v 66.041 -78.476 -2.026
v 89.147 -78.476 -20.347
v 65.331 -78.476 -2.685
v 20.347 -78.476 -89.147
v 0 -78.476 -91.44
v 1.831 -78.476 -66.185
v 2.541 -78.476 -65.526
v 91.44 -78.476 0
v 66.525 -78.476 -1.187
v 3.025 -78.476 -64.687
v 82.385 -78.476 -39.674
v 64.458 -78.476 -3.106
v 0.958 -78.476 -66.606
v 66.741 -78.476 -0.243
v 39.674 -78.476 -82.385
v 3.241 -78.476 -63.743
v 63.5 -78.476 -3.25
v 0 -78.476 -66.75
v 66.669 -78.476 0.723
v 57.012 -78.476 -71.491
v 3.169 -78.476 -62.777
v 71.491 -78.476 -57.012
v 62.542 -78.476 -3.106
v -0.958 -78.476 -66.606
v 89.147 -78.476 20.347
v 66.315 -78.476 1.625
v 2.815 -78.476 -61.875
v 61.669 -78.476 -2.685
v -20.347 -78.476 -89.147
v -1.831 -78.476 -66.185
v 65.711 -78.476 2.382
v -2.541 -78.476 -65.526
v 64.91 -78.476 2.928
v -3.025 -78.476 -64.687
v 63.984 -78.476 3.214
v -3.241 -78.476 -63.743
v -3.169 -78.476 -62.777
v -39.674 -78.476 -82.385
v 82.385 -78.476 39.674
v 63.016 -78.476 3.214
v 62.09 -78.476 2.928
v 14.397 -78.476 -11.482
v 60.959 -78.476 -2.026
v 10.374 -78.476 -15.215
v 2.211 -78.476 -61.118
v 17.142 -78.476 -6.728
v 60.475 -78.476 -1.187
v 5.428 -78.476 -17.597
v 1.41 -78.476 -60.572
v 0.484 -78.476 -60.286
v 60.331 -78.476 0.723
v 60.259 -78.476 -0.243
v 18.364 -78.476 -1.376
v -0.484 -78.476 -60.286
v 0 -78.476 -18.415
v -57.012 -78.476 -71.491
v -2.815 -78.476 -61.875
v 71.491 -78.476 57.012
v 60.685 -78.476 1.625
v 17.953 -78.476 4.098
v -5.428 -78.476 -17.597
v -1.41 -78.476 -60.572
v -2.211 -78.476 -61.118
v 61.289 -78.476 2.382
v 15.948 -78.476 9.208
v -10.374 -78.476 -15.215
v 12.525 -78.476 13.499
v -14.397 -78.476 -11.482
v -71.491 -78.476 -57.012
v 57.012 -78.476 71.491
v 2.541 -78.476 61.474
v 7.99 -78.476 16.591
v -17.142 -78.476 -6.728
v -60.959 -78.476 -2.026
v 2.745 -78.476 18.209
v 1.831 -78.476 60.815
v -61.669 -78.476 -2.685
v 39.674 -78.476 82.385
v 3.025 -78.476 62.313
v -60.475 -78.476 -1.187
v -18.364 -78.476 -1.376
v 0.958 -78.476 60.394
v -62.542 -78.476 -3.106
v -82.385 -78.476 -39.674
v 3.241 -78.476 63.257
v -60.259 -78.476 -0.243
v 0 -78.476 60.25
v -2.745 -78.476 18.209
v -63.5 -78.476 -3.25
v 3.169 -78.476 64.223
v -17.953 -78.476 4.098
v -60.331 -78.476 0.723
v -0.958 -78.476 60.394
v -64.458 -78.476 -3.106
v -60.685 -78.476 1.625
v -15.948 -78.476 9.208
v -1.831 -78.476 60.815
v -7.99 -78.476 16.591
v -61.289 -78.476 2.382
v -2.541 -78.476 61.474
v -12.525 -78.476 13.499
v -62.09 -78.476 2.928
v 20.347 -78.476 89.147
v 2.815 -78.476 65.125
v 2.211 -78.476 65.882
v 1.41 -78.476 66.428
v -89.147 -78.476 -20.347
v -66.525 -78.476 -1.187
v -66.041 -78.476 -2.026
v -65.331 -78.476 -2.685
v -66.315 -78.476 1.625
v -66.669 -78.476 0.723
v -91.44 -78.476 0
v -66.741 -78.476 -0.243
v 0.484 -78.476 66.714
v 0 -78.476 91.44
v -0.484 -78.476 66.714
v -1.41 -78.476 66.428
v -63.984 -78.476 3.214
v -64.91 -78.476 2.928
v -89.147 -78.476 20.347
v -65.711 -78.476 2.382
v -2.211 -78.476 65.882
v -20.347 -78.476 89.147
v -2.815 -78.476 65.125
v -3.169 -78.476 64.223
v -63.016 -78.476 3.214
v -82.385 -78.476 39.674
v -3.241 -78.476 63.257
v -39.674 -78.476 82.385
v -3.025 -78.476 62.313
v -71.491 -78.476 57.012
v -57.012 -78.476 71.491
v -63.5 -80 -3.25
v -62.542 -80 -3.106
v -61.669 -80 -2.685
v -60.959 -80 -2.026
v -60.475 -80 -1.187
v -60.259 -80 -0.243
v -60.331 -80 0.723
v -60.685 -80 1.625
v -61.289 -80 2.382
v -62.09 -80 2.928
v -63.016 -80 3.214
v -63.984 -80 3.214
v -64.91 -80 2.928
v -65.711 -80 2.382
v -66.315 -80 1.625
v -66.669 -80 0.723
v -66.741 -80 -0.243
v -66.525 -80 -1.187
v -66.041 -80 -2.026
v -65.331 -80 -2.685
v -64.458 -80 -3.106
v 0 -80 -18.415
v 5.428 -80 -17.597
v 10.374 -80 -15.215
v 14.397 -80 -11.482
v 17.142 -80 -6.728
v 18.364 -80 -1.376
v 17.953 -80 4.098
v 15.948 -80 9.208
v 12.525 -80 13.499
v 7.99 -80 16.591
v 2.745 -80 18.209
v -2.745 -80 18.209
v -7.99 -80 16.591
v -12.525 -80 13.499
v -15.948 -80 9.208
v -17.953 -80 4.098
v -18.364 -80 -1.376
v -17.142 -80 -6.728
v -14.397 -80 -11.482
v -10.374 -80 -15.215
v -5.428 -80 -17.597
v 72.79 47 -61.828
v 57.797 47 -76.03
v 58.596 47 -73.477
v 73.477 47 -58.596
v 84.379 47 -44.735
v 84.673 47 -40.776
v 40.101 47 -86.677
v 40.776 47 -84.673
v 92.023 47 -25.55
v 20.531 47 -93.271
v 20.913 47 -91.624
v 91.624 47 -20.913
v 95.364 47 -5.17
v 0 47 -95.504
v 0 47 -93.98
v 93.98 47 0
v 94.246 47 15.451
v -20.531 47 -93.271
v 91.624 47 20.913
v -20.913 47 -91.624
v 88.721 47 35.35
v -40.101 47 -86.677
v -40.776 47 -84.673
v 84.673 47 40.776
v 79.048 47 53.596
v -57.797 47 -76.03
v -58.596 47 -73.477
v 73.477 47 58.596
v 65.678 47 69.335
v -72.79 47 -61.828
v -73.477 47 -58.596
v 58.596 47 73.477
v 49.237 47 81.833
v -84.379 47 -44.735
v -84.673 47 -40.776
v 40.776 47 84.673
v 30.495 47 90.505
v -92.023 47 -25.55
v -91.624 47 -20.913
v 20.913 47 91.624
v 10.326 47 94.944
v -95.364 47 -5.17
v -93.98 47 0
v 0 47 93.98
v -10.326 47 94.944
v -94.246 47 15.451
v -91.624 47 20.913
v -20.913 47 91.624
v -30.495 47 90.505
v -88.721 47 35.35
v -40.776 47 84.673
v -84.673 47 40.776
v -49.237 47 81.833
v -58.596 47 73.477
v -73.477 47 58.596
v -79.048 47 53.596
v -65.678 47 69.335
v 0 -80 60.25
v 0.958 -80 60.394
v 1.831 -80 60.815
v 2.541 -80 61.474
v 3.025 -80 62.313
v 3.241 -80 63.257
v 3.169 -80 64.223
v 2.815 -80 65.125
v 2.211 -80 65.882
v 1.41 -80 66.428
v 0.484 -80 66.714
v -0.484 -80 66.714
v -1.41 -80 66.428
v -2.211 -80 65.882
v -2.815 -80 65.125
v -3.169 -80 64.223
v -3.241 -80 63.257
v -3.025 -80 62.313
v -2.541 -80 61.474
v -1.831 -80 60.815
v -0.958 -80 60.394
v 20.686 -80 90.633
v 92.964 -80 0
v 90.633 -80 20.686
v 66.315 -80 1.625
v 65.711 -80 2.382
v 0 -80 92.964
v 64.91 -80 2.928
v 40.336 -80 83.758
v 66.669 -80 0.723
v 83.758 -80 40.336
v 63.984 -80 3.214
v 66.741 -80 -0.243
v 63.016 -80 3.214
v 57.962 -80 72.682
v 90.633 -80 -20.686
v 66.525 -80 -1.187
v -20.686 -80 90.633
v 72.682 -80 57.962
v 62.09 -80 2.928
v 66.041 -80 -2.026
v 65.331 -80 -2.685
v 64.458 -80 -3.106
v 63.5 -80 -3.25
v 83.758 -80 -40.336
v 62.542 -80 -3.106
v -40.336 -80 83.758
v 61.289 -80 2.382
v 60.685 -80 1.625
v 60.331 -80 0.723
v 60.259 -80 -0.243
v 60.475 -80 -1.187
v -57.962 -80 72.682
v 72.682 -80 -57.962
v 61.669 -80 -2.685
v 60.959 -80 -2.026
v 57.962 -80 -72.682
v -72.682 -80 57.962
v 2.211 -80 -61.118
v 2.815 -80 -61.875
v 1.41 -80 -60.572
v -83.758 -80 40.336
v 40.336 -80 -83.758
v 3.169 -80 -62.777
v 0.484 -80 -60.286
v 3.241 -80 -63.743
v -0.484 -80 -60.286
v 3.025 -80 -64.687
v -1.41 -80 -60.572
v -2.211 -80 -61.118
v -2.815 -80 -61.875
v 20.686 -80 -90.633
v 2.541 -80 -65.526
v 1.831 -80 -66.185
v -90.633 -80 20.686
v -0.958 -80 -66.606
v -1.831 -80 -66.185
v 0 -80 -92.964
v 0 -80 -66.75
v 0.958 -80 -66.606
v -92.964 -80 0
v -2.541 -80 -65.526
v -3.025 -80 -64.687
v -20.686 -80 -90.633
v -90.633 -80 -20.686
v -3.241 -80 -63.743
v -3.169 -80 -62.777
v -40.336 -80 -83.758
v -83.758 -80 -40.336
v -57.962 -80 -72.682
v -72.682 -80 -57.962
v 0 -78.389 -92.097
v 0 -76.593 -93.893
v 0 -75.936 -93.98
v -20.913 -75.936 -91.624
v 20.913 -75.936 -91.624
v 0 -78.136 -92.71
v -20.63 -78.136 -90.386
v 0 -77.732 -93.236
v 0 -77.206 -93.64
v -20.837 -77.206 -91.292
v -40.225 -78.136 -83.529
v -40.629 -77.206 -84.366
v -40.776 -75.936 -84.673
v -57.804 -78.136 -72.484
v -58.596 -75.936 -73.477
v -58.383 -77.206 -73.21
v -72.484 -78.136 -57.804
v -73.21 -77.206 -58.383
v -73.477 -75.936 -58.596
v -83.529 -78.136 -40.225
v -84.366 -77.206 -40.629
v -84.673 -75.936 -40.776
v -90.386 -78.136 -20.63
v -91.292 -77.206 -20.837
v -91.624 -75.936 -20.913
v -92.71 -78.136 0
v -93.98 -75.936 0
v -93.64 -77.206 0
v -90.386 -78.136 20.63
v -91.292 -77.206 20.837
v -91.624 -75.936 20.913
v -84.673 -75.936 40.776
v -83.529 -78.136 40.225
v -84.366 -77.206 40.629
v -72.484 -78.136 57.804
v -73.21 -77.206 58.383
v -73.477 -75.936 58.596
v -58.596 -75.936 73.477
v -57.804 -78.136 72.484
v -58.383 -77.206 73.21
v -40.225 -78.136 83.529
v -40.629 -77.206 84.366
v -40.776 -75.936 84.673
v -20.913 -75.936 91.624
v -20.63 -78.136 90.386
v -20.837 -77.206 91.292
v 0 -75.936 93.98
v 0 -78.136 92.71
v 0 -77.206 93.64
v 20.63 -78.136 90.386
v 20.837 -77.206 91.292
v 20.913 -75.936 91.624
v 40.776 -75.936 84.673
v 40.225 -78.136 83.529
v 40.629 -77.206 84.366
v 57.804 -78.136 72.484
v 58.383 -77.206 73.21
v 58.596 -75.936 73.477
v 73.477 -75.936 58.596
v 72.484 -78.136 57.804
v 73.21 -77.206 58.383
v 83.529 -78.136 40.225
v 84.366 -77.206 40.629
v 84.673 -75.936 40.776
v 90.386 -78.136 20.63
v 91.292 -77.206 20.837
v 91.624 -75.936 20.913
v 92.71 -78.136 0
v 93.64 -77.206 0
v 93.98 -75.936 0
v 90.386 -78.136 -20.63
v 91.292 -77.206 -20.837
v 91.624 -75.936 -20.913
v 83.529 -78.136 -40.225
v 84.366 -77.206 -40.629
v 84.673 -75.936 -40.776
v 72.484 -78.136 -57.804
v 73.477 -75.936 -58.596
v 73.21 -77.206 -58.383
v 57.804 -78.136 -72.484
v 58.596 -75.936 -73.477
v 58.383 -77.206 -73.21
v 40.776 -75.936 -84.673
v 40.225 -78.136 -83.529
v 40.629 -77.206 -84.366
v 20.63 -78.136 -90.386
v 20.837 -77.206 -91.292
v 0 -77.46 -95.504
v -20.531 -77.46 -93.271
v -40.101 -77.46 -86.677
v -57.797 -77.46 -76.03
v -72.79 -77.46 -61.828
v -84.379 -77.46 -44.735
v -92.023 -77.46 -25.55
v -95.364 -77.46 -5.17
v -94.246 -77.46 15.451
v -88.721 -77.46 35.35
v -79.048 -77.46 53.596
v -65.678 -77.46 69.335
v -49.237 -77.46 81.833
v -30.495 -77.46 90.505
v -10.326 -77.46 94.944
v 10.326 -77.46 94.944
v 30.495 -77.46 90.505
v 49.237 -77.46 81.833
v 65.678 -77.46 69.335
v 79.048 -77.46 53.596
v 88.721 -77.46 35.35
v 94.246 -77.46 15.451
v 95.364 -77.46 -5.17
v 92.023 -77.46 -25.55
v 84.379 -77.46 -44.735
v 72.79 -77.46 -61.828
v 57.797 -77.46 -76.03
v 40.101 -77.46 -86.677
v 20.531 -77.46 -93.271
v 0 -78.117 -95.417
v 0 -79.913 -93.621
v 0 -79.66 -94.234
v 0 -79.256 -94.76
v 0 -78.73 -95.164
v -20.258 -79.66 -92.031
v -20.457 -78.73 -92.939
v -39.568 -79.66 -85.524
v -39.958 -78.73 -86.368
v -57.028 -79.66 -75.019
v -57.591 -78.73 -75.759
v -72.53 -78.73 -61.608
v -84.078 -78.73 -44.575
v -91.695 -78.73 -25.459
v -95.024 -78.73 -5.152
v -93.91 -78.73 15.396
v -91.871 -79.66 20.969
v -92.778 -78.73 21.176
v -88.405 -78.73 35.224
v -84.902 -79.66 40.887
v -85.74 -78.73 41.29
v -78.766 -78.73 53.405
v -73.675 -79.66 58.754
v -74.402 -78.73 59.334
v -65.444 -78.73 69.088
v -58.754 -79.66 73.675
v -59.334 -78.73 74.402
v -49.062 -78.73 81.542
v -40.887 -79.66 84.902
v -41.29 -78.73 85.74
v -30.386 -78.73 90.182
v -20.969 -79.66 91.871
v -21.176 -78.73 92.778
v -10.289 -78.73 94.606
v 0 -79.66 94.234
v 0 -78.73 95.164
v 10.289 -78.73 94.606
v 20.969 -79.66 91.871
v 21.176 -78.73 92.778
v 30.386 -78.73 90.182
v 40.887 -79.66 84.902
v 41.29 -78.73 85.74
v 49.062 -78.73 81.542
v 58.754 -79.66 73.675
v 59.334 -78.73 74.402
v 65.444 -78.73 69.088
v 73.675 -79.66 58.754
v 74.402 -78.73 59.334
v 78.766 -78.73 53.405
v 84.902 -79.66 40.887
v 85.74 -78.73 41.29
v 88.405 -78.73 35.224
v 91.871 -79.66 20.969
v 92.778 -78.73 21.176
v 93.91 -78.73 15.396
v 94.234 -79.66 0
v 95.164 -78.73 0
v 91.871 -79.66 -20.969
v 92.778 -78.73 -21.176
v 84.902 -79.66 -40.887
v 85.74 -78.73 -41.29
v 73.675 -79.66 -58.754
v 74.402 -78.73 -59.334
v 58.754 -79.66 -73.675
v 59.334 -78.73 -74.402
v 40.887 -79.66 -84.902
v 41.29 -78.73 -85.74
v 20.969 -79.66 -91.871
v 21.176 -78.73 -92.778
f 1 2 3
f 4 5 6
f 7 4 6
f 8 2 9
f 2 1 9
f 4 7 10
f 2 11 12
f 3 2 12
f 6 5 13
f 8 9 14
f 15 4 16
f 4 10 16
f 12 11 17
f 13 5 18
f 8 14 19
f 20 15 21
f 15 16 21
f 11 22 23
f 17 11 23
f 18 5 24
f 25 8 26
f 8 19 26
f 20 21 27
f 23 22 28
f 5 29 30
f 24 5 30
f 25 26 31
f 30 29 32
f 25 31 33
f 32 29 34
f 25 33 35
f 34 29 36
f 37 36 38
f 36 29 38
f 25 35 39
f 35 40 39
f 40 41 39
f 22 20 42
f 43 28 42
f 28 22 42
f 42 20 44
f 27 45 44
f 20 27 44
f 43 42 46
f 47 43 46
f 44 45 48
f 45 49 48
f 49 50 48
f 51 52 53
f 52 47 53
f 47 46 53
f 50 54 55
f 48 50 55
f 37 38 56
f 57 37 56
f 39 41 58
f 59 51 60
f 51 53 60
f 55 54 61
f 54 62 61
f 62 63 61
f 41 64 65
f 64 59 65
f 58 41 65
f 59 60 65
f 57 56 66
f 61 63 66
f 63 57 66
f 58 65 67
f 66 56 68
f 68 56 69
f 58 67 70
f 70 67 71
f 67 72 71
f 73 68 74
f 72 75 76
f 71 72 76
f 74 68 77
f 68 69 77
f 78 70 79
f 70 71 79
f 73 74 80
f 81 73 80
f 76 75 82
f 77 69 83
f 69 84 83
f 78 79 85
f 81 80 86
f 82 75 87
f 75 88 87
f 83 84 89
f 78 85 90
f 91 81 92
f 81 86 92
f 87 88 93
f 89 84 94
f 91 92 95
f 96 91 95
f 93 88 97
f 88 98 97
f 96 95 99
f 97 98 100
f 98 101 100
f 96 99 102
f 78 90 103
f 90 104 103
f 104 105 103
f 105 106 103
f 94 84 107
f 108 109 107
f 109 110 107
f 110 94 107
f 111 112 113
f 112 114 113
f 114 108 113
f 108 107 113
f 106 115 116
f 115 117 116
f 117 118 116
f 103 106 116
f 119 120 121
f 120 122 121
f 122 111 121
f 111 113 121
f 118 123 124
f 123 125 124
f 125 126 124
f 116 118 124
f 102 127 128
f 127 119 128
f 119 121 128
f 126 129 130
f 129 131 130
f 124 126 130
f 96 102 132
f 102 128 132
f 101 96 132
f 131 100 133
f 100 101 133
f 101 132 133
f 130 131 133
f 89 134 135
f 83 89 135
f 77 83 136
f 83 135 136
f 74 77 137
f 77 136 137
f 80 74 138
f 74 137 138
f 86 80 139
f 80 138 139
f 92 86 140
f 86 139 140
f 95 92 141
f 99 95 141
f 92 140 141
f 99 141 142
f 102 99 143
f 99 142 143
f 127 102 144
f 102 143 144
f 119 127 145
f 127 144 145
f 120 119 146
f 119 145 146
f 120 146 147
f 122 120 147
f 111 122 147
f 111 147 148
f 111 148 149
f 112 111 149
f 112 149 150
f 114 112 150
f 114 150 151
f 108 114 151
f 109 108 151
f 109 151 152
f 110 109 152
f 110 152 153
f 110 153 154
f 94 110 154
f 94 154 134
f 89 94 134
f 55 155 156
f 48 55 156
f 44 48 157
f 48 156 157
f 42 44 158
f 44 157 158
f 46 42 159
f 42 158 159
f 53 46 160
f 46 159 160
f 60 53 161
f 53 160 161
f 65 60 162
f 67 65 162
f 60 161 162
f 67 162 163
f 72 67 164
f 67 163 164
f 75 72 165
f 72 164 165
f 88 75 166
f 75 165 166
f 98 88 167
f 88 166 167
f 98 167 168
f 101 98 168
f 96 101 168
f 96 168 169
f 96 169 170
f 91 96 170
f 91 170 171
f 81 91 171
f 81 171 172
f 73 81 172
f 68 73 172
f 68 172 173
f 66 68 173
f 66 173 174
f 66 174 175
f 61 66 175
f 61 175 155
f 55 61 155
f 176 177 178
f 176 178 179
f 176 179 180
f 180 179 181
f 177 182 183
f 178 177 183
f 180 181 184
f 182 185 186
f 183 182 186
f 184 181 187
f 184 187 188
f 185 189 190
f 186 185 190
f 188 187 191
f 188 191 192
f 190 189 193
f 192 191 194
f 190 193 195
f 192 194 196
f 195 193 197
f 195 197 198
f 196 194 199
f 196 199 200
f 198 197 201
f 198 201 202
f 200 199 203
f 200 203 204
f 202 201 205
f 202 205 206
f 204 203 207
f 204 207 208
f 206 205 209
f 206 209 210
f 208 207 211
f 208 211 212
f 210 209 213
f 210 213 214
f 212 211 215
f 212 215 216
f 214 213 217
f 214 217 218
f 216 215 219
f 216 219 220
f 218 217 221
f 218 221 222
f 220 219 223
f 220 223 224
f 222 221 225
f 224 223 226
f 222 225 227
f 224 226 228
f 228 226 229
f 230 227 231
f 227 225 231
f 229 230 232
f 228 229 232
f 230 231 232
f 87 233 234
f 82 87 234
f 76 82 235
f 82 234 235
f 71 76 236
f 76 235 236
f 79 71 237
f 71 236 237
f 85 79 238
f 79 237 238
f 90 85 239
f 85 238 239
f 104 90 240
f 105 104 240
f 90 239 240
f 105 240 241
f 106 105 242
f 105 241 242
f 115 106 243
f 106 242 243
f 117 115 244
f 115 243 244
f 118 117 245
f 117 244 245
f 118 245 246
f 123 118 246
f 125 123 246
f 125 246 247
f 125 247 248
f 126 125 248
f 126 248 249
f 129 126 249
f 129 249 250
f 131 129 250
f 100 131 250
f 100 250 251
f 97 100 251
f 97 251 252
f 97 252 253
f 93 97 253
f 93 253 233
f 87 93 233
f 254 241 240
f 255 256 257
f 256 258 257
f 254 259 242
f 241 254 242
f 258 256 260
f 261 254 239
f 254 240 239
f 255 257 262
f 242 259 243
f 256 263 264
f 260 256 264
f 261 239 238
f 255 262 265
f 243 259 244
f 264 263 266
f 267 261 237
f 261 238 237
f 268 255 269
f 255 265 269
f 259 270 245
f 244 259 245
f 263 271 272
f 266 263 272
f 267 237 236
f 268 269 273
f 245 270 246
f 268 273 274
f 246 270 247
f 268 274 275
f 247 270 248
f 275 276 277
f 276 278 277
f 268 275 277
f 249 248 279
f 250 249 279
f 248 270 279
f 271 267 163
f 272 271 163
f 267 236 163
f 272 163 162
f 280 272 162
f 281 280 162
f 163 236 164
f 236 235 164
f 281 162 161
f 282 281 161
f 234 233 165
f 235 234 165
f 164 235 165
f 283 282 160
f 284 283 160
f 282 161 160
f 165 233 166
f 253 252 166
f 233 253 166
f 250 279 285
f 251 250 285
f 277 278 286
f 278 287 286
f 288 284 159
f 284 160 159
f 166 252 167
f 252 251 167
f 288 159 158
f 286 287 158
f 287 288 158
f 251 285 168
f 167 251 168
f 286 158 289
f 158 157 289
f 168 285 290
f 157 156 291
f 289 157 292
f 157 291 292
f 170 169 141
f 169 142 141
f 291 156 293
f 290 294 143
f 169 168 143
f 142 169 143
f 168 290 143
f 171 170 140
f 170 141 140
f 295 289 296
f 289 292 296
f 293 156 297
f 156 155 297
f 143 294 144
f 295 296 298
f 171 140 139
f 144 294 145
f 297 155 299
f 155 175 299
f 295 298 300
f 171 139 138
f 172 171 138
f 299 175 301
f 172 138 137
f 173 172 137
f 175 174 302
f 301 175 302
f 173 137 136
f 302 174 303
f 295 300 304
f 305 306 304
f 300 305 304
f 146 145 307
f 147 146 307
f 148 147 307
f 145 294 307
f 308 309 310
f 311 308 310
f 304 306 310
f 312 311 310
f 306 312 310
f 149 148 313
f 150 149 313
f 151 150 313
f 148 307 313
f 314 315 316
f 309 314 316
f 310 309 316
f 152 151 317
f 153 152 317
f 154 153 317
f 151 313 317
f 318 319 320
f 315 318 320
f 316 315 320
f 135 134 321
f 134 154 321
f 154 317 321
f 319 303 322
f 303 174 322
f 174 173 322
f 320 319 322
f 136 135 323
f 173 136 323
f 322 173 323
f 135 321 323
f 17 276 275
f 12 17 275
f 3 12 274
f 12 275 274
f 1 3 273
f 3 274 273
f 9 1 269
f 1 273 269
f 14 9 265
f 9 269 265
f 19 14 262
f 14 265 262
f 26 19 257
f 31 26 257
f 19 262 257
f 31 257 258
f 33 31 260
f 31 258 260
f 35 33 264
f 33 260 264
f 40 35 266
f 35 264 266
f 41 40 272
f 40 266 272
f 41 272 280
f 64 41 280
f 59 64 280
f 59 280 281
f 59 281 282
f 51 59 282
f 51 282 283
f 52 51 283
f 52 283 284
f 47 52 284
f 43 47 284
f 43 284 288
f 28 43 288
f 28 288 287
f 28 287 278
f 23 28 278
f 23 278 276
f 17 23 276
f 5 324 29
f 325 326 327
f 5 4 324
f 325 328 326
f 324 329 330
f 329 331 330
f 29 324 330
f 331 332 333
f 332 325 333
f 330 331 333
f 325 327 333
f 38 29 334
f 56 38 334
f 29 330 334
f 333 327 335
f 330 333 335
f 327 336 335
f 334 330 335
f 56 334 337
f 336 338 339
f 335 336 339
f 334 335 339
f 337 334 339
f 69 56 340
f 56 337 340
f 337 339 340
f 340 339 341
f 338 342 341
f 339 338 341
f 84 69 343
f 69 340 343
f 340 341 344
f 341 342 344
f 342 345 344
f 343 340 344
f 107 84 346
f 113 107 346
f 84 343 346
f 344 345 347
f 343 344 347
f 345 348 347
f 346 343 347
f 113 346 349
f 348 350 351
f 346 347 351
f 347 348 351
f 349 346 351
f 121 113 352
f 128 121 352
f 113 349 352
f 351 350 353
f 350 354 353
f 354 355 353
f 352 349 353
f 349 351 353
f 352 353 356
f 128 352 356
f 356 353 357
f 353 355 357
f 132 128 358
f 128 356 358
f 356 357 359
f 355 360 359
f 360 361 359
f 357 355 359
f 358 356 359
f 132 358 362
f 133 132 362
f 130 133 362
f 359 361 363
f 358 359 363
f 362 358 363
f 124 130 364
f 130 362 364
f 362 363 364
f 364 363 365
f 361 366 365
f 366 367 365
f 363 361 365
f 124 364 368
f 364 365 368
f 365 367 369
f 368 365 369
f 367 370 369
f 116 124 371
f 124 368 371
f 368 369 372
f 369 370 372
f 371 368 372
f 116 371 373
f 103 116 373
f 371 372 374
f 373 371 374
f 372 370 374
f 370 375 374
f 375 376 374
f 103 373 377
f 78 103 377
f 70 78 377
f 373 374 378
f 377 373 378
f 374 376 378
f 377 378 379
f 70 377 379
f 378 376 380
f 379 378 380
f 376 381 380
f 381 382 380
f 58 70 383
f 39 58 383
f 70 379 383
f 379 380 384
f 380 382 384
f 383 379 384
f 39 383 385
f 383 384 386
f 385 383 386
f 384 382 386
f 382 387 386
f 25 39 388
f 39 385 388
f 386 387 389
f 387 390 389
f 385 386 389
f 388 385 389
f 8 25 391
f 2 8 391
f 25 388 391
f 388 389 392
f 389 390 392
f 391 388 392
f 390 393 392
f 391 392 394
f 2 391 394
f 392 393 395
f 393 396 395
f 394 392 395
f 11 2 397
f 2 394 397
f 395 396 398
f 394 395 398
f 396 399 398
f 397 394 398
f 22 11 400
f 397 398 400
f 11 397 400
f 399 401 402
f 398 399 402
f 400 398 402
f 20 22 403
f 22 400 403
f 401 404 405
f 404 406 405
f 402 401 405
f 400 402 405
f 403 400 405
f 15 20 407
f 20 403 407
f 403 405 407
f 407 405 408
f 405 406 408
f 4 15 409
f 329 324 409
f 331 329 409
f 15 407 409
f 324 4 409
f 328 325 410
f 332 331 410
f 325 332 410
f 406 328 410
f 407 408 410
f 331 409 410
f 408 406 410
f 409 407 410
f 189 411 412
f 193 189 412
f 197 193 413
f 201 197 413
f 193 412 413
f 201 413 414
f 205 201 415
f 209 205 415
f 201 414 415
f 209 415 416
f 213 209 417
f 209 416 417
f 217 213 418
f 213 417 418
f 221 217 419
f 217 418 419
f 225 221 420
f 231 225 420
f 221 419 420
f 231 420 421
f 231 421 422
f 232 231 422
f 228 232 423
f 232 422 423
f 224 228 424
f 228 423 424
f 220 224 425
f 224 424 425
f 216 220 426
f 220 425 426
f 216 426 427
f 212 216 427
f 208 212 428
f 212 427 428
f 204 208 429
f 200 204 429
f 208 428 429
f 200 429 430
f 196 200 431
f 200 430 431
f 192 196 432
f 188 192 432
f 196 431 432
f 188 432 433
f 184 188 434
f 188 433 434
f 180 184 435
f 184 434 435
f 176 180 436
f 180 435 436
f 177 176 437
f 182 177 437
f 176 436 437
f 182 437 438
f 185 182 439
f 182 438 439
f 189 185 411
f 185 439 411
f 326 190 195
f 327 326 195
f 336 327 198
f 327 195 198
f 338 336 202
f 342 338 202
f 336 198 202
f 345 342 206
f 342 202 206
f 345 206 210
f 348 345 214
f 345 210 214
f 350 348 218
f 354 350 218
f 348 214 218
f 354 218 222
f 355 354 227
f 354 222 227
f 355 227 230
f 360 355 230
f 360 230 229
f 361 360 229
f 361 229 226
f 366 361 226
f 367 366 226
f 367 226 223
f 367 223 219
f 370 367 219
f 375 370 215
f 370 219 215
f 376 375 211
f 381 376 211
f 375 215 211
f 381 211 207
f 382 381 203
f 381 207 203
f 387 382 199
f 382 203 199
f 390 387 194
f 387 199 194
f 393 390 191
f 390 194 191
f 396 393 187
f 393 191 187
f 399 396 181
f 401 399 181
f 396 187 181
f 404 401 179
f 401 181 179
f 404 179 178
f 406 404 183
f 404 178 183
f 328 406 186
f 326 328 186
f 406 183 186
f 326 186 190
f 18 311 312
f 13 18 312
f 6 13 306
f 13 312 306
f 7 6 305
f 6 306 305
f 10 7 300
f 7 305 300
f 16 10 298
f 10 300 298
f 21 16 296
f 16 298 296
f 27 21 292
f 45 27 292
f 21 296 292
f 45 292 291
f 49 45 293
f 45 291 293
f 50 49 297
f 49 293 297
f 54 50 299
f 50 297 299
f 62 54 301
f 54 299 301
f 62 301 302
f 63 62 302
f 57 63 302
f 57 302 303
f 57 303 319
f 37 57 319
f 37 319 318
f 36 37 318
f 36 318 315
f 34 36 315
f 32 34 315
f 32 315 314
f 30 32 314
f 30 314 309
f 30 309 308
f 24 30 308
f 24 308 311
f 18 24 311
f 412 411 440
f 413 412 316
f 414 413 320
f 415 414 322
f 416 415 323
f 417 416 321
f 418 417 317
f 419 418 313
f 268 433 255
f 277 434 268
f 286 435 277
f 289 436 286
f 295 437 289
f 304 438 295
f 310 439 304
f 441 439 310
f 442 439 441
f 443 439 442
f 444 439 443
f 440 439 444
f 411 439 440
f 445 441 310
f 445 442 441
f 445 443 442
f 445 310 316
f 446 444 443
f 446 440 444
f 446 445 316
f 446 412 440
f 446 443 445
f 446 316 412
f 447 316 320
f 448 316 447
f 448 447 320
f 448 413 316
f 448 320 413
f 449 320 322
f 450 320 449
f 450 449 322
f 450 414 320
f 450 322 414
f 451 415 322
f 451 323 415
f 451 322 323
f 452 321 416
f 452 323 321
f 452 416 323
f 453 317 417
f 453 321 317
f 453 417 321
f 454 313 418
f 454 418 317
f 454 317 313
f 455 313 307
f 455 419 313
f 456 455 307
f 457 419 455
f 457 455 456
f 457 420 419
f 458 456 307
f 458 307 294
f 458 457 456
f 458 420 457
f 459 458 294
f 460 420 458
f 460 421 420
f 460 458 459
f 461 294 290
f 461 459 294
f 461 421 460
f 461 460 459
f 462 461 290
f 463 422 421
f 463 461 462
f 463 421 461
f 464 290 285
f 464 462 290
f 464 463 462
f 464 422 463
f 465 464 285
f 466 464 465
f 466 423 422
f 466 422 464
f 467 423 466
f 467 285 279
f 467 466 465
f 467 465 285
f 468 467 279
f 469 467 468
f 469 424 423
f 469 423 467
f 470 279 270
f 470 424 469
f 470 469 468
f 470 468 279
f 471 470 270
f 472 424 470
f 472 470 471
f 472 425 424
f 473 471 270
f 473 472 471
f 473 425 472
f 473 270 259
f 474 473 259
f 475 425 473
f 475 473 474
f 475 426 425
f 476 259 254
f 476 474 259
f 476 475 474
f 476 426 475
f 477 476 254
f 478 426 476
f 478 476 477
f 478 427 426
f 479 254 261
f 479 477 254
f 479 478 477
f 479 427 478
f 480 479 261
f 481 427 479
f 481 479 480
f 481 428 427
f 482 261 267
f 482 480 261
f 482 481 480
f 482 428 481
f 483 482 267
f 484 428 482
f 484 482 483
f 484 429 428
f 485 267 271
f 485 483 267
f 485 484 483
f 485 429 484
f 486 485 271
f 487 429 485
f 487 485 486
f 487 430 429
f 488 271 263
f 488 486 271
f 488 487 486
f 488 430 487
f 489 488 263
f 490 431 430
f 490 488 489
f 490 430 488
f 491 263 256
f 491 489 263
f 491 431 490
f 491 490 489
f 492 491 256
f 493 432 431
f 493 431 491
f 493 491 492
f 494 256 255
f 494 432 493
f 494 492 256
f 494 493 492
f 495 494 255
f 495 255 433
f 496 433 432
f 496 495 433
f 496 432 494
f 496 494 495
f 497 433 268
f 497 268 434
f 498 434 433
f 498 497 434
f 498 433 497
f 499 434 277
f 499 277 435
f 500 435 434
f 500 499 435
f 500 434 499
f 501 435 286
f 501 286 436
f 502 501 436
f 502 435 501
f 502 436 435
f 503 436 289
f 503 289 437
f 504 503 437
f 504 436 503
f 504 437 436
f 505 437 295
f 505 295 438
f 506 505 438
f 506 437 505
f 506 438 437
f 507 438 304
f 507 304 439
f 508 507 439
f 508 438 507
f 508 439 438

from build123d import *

# Parameters (mm, degrees)
CUT_EXTRUDE2_REACH = 187.394
MOTOR_HOLE_R       = 18.415
MOTOR_HOLE_R_2     = 3.25
FILLET1_R          = 2.54


with BuildPart() as part:
    # Compartment → Revolve1 (revolve)
    with BuildSketch(Plane.XY, mode=Mode.PRIVATE) as revolve1_sk:
        Polygon((95.504, -80), (0, -80), (0, -78.476), (93.98, -78.476), (93.98, 47), (95.504, 47), align=None)
    revolve(revolve1_sk.sketch.rotate(Axis((0, 0, 0), (0, 1, 0)), 90), axis=Axis((0, 0, 0), (0, 1, 0)))

    # Motor Hole → Cut-Extrude2 (cut, up to next)
    with BuildSketch(Plane.XZ.offset(80), mode=Mode.PRIVATE) as cut_extrude2_sk1:
        with Locations(Location((0, 0, 0), (0, 0, 270))):
            Circle(MOTOR_HOLE_R)
    cut_extrude2_tool1 = extrude(cut_extrude2_sk1.sketch, amount=-CUT_EXTRUDE2_REACH, mode=Mode.PRIVATE) & part.part
    # Motor Hole → Cut-Extrude2 (cut, up to next)
    with BuildSketch(Plane.XZ.offset(80), mode=Mode.PRIVATE) as cut_extrude2_sk2:
        with Locations(Location((0, 63.5, 0), (0, 0, 270))):
            Circle(MOTOR_HOLE_R_2)
    cut_extrude2_tool2 = extrude(cut_extrude2_sk2.sketch, amount=-CUT_EXTRUDE2_REACH, mode=Mode.PRIVATE) & part.part
    # Motor Hole → Cut-Extrude2 (cut, up to next)
    with BuildSketch(Plane.XZ.offset(80), mode=Mode.PRIVATE) as cut_extrude2_sk3:
        with Locations(Location((63.5, 0, 0), (0, 0, 270))):
            Circle(MOTOR_HOLE_R_2)
    cut_extrude2_tool3 = extrude(cut_extrude2_sk3.sketch, amount=-CUT_EXTRUDE2_REACH, mode=Mode.PRIVATE) & part.part
    # Motor Hole → Cut-Extrude2 (cut, up to next)
    with BuildSketch(Plane.XZ.offset(80), mode=Mode.PRIVATE) as cut_extrude2_sk4:
        with Locations(Location((0, -63.5, 0), (0, 0, 270))):
            Circle(MOTOR_HOLE_R_2)
    cut_extrude2_tool4 = extrude(cut_extrude2_sk4.sketch, amount=-CUT_EXTRUDE2_REACH, mode=Mode.PRIVATE) & part.part
    # Motor Hole → Cut-Extrude2 (cut, up to next)
    with BuildSketch(Plane.XZ.offset(80), mode=Mode.PRIVATE) as cut_extrude2_sk5:
        with Locations(Location((-63.5, 0, 0), (0, 0, 270))):
            Circle(MOTOR_HOLE_R_2)
    cut_extrude2_tool5 = extrude(cut_extrude2_sk5.sketch, amount=-CUT_EXTRUDE2_REACH, mode=Mode.PRIVATE) & part.part
    add(cut_extrude2_tool1.solids().sort_by_distance((0, -80, 0))[0], mode=Mode.SUBTRACT)
    add(cut_extrude2_tool2.solids().sort_by_distance((0, -80, 63.5))[0], mode=Mode.SUBTRACT)
    add(cut_extrude2_tool3.solids().sort_by_distance((63.5, -80, 0))[0], mode=Mode.SUBTRACT)
    add(cut_extrude2_tool4.solids().sort_by_distance((0, -80, -63.5))[0], mode=Mode.SUBTRACT)
    add(cut_extrude2_tool5.solids().sort_by_distance((-63.5, -80, 0))[0], mode=Mode.SUBTRACT)

    # Fillet1
    fillet1_edges = [part.edges().sort_by_distance(p)[0] for p in [
        (0, -78.476, 93.98),
        (0, -80, 95.504),
    ]]
    fillet(fillet1_edges, radius=FILLET1_R)


solid = part.part
